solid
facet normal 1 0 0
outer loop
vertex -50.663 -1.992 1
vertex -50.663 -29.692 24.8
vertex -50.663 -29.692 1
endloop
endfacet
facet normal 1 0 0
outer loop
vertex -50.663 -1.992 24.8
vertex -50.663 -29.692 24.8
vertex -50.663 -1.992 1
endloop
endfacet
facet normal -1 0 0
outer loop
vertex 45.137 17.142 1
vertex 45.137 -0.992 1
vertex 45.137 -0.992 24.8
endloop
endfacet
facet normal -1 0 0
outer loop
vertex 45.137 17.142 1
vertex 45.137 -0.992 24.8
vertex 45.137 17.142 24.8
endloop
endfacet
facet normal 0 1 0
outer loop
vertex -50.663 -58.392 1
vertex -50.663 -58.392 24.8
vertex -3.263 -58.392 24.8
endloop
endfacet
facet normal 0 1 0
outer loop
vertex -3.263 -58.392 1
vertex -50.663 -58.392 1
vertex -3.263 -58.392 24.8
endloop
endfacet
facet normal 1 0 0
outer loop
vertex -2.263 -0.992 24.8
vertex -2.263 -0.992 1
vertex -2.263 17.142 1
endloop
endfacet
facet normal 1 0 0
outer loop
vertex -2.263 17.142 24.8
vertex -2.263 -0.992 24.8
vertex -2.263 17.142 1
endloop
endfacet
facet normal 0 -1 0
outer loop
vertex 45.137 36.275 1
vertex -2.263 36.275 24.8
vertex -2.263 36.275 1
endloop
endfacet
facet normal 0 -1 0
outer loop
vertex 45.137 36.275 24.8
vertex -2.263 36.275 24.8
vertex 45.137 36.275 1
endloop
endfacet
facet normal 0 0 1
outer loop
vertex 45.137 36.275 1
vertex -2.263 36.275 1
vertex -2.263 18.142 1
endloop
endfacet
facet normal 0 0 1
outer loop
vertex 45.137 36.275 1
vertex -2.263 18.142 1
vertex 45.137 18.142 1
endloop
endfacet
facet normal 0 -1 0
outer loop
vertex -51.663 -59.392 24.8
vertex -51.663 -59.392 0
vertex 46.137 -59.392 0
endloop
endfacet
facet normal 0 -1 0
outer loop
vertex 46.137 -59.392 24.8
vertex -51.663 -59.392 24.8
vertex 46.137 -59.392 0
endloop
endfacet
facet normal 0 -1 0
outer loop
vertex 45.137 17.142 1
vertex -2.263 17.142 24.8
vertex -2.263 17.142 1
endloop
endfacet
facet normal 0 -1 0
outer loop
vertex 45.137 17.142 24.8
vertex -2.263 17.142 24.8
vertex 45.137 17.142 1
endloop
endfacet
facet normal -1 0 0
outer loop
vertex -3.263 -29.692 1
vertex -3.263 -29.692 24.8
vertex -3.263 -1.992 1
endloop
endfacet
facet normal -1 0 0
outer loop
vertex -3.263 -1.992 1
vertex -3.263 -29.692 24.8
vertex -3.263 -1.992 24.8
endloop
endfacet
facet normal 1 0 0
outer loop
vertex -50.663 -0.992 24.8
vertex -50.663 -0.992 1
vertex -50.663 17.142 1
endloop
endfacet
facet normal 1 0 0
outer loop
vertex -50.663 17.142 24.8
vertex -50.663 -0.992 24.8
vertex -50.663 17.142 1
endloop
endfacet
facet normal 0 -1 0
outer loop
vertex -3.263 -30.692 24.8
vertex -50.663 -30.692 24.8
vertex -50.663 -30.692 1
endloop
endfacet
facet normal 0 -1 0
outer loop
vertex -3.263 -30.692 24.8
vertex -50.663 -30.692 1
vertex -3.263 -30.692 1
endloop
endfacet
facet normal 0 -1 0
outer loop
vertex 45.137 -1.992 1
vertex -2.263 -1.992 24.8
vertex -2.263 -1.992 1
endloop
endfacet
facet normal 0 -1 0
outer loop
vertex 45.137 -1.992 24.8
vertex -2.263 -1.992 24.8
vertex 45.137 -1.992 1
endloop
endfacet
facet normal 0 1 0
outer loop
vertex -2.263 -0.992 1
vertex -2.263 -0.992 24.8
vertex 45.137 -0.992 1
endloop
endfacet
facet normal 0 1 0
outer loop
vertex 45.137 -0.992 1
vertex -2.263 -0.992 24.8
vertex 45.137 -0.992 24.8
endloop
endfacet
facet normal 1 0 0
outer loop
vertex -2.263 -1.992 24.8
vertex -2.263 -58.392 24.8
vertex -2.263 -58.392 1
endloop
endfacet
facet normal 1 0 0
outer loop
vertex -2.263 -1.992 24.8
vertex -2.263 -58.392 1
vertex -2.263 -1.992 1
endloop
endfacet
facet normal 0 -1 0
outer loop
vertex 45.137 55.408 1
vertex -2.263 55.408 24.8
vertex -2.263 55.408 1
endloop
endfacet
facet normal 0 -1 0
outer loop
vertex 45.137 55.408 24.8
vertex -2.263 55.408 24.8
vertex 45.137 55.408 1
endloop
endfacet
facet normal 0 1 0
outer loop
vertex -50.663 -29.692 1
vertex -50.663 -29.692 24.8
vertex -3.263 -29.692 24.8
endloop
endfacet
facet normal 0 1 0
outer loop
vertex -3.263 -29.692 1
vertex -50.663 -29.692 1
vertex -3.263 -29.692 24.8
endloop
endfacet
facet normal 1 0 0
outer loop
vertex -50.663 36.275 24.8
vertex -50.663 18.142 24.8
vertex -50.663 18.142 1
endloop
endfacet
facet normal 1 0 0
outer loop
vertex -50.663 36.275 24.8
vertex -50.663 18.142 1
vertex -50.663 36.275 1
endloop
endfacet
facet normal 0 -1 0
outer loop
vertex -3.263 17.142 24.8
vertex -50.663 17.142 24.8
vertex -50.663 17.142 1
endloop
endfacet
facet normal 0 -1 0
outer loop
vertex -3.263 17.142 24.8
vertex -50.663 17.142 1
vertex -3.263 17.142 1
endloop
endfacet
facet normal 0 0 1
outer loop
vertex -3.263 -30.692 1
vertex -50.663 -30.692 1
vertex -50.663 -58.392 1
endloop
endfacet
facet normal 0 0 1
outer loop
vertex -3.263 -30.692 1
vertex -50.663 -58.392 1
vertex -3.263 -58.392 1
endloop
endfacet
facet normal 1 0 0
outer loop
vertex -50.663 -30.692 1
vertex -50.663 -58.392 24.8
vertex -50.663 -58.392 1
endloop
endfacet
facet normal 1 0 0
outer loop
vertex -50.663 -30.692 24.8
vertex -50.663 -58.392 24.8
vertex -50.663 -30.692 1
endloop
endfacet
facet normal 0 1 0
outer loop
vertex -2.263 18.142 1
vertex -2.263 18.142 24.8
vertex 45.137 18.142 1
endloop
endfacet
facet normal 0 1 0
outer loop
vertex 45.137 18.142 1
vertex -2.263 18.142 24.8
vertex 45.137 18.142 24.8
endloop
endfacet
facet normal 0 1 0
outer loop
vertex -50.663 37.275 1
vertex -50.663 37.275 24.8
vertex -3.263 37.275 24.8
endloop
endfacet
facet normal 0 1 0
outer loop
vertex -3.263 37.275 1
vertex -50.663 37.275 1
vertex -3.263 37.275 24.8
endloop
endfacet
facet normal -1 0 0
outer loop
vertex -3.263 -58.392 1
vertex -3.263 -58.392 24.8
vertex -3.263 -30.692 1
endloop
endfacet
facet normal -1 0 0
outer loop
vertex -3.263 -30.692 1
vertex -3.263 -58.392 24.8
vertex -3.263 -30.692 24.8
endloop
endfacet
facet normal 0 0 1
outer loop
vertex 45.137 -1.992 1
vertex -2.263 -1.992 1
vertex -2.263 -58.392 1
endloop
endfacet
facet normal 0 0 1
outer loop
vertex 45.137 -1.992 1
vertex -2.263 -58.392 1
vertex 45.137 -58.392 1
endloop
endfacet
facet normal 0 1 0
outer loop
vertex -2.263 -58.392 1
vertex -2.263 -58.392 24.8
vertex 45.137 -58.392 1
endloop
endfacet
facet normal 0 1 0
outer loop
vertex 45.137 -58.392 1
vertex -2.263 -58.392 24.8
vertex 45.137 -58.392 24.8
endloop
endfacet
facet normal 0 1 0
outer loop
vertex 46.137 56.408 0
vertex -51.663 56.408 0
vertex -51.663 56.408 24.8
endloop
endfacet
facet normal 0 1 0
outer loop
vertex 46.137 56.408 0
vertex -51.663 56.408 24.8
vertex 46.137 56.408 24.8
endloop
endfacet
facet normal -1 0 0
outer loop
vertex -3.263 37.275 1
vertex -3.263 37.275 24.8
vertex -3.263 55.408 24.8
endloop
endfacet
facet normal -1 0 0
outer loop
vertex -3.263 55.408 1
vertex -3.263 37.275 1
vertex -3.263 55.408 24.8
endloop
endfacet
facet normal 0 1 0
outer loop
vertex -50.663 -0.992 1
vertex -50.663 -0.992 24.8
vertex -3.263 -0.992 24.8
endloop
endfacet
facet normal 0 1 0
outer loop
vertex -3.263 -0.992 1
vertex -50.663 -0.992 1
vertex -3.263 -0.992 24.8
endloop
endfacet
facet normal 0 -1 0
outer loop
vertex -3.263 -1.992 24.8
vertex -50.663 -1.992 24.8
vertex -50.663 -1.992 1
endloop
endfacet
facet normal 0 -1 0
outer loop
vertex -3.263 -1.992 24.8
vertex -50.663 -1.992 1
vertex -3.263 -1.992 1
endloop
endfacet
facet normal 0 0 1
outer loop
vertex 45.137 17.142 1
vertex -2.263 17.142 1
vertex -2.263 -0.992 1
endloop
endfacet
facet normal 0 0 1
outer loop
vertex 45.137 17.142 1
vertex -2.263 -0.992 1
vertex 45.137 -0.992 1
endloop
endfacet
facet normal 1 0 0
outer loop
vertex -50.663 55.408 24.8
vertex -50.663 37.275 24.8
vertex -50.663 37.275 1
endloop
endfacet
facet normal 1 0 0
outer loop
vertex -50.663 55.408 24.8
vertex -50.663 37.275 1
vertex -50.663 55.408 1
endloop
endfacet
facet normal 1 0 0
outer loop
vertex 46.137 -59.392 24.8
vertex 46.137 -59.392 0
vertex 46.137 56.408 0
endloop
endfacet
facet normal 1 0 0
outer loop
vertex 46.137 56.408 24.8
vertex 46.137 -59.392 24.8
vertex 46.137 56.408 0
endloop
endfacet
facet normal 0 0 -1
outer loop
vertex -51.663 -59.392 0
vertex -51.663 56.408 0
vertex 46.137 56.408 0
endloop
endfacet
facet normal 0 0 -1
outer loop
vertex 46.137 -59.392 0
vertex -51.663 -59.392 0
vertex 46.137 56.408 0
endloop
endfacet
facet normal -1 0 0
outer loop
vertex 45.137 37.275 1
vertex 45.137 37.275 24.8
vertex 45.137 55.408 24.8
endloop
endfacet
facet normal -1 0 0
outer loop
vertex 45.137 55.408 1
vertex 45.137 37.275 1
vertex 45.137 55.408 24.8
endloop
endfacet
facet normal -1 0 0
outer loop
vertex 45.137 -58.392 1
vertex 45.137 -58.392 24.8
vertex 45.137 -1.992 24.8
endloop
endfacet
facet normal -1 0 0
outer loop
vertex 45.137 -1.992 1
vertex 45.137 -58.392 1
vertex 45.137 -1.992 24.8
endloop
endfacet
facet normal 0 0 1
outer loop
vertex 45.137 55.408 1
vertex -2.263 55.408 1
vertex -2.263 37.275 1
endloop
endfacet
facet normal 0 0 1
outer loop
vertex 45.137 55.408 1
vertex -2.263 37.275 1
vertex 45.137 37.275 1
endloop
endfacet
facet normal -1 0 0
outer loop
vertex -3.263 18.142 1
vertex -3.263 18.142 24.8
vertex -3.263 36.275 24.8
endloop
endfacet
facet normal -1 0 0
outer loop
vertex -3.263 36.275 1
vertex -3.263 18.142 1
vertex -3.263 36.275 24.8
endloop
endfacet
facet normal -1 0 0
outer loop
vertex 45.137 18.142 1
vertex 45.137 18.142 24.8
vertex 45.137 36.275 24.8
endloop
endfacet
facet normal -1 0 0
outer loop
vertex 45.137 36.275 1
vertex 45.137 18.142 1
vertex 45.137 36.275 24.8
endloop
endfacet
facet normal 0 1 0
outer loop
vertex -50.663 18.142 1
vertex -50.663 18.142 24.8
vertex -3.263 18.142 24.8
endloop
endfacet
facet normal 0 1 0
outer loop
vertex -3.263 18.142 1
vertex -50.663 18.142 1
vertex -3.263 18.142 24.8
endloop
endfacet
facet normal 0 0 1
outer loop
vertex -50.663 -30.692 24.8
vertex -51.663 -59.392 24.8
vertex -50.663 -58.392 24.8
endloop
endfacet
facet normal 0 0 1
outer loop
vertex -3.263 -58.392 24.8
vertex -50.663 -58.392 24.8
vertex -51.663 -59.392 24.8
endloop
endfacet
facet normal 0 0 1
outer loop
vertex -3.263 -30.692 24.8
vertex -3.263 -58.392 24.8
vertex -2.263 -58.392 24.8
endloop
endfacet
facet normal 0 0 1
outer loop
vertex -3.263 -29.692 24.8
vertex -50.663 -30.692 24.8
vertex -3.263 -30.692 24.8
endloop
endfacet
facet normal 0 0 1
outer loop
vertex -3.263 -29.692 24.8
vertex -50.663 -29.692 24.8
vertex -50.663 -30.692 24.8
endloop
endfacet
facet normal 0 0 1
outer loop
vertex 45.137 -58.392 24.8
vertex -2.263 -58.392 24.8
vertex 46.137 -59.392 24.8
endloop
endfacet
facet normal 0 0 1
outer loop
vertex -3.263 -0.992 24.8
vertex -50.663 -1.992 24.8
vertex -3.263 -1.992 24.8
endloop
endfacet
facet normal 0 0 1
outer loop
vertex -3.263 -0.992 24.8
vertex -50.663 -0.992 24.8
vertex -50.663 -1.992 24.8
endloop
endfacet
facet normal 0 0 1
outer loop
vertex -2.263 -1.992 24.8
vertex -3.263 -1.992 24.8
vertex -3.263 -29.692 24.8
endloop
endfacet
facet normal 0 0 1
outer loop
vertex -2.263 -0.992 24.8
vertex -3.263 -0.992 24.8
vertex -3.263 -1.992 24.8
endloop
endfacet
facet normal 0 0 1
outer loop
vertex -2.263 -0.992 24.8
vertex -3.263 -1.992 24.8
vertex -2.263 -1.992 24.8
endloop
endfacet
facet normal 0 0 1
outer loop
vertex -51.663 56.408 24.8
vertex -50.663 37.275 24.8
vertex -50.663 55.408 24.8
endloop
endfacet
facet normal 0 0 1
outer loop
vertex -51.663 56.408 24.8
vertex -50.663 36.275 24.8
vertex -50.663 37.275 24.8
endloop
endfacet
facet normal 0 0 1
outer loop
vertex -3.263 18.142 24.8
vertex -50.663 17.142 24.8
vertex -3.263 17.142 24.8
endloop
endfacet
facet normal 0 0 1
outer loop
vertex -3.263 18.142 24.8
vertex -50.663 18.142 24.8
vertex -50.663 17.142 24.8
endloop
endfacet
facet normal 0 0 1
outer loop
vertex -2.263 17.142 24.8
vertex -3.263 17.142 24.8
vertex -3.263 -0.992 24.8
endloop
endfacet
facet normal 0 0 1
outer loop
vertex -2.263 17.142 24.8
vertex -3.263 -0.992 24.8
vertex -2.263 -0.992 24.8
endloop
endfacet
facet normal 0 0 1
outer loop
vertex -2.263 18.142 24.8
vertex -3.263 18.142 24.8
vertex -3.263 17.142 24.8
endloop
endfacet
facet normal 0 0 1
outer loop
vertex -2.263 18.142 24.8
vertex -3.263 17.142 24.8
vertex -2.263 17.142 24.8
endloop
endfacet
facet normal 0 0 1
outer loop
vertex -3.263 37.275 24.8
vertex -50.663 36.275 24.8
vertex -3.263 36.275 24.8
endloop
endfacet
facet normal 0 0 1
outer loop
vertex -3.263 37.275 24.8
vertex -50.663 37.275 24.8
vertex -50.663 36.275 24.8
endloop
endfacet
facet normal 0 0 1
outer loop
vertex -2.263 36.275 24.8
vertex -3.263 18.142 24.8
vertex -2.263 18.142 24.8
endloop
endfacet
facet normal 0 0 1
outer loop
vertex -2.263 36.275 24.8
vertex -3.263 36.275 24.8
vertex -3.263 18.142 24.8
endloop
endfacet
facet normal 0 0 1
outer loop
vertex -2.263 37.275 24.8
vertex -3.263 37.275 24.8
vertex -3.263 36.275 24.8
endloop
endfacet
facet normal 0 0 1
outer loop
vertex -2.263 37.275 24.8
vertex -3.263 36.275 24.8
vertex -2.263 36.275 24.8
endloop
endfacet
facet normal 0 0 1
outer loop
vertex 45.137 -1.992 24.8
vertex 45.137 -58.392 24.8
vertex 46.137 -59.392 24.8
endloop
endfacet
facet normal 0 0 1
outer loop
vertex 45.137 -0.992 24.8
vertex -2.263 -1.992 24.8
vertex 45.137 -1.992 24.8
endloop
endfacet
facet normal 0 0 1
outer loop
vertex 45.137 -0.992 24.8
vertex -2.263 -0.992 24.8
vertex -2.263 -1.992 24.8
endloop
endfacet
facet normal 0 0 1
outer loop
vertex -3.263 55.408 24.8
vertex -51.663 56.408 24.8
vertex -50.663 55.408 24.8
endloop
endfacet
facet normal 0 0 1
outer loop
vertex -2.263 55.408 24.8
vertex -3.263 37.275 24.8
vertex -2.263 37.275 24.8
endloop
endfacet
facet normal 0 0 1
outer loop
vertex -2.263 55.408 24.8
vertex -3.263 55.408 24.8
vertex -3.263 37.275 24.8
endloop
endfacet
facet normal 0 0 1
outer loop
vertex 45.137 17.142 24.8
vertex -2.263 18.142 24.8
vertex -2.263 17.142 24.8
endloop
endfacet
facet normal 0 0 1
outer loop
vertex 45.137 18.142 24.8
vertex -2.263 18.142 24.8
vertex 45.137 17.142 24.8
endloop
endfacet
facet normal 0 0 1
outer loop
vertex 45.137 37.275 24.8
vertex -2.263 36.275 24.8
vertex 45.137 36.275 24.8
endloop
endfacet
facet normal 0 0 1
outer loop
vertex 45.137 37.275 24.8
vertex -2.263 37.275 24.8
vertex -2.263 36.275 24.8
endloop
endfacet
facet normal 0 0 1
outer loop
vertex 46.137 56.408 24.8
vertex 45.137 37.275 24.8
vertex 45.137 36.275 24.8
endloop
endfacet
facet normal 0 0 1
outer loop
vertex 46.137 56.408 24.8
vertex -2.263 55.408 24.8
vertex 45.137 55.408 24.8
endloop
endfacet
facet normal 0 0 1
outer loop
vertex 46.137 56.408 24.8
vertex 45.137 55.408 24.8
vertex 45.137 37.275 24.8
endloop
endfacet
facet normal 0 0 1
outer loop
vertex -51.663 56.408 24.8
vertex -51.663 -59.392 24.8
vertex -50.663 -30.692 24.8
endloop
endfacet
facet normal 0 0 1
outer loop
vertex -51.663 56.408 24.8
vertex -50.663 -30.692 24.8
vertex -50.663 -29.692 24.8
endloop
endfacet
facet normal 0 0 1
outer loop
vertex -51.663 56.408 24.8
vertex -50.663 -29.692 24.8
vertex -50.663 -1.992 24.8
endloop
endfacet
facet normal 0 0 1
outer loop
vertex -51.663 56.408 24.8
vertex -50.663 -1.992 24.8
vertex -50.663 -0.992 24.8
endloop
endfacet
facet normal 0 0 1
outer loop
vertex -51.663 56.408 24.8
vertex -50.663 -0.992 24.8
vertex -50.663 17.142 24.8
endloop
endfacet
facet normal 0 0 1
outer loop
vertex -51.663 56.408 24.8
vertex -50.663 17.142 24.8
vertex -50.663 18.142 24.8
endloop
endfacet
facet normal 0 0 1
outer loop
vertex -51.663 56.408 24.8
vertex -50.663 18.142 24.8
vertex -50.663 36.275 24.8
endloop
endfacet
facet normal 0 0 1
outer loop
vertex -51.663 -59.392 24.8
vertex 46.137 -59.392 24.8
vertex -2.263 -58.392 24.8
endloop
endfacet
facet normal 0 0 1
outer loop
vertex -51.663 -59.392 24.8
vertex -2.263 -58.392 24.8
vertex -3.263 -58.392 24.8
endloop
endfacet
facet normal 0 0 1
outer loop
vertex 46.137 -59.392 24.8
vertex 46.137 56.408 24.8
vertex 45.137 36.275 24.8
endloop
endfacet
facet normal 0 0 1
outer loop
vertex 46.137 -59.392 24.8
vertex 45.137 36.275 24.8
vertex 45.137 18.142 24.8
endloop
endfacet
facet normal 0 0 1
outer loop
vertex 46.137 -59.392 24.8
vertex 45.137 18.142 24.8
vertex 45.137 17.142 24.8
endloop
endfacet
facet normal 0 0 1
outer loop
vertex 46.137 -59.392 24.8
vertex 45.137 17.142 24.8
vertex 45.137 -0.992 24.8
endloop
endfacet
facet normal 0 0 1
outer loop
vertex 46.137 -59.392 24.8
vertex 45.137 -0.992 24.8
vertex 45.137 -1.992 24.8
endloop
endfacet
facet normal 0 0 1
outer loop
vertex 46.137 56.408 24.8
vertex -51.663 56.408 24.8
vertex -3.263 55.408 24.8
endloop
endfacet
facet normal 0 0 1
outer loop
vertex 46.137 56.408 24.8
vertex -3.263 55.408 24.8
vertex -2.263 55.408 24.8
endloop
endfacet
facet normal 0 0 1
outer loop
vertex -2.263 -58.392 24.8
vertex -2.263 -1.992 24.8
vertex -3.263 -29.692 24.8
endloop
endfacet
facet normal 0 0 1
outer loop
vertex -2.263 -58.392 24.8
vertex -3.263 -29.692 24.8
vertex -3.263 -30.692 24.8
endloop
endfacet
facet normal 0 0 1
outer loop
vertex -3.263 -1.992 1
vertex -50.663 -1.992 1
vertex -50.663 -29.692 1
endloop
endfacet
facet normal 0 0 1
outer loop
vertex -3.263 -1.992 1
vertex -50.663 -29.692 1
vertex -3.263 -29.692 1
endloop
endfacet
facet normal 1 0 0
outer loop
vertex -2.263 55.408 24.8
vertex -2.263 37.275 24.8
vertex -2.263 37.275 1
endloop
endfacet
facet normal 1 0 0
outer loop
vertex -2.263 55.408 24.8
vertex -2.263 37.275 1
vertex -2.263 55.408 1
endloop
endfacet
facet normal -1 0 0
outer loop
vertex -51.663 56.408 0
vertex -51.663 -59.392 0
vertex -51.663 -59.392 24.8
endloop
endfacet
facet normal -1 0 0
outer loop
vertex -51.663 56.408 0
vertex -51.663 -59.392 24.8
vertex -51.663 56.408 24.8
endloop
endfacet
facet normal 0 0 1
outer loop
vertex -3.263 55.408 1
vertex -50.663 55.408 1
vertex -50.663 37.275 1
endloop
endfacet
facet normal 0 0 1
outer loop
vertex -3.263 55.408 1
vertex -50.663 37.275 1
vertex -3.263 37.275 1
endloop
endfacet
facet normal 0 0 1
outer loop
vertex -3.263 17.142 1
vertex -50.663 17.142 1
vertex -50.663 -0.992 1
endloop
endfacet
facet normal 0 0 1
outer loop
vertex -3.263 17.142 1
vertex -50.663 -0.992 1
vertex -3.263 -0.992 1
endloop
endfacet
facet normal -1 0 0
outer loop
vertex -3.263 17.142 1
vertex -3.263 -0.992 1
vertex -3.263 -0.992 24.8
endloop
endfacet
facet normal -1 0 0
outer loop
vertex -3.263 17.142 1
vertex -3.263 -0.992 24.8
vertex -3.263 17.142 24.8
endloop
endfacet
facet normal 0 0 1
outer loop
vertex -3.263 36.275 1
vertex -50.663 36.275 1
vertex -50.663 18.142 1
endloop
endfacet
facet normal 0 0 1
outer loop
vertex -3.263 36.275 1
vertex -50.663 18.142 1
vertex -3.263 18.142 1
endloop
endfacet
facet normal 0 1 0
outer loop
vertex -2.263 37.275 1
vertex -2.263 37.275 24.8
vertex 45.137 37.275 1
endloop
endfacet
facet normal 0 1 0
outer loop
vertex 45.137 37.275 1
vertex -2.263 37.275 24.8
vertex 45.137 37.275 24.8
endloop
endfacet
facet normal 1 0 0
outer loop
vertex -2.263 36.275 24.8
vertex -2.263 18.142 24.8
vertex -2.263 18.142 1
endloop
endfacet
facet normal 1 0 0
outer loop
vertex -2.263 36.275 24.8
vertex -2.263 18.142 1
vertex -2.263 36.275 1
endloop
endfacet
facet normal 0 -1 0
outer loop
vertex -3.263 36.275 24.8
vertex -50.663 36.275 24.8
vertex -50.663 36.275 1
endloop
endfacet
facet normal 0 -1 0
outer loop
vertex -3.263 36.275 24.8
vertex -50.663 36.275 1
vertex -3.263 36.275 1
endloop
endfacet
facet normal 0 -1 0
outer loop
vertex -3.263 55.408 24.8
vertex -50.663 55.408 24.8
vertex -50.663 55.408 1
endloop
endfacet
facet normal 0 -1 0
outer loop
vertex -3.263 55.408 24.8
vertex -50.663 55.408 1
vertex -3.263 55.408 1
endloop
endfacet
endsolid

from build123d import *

# Parameters (mm, degrees)
F0_W     = 97.8
F0_H     = 115.8
F1_DEPTH = 24.8
F2_W     = 47.4
F2_H     = 27.7
F2_H_2   = 56.4
F2_H_3   = 18.133334
F2_H_4   = 18.133333
F3_DEPTH = 23.8


with BuildPart() as f1:
    # F0 (on Top) → F1 (new body)
    with BuildSketch(Plane.XY):
        with Locations((-2.762959, -1.491597)):
            Rectangle(F0_W, F0_H)
    extrude(amount=F1_DEPTH)

    # F2 (on face) → F3 (cut)
    with BuildSketch(Plane.XY.offset(24.8)):
        with Locations((-26.962959, -44.541597)):
            Rectangle(F2_W, F2_H)
        with Locations((-26.962959, -15.841597)):
            Rectangle(F2_W, F2_H)
        with Locations((21.437041, -30.191597)):
            Rectangle(F2_W, F2_H_2)
        with Locations((21.437041, 8.07507)):
            Rectangle(F2_W, F2_H_3)
        with Locations((-26.962959, 8.07507)):
            Rectangle(F2_W, F2_H_3)
        with Locations((-26.962959, 27.208403)):
            Rectangle(F2_W, F2_H_4)
        with Locations((21.437041, 27.208403)):
            Rectangle(F2_W, F2_H_4)
        with Locations((21.437041, 46.341736)):
            Rectangle(F2_W, F2_H_4)
        with Locations((-26.962959, 46.341736)):
            Rectangle(F2_W, F2_H_4)
    extrude(amount=-F3_DEPTH, mode=Mode.SUBTRACT)


solid = f1.part
